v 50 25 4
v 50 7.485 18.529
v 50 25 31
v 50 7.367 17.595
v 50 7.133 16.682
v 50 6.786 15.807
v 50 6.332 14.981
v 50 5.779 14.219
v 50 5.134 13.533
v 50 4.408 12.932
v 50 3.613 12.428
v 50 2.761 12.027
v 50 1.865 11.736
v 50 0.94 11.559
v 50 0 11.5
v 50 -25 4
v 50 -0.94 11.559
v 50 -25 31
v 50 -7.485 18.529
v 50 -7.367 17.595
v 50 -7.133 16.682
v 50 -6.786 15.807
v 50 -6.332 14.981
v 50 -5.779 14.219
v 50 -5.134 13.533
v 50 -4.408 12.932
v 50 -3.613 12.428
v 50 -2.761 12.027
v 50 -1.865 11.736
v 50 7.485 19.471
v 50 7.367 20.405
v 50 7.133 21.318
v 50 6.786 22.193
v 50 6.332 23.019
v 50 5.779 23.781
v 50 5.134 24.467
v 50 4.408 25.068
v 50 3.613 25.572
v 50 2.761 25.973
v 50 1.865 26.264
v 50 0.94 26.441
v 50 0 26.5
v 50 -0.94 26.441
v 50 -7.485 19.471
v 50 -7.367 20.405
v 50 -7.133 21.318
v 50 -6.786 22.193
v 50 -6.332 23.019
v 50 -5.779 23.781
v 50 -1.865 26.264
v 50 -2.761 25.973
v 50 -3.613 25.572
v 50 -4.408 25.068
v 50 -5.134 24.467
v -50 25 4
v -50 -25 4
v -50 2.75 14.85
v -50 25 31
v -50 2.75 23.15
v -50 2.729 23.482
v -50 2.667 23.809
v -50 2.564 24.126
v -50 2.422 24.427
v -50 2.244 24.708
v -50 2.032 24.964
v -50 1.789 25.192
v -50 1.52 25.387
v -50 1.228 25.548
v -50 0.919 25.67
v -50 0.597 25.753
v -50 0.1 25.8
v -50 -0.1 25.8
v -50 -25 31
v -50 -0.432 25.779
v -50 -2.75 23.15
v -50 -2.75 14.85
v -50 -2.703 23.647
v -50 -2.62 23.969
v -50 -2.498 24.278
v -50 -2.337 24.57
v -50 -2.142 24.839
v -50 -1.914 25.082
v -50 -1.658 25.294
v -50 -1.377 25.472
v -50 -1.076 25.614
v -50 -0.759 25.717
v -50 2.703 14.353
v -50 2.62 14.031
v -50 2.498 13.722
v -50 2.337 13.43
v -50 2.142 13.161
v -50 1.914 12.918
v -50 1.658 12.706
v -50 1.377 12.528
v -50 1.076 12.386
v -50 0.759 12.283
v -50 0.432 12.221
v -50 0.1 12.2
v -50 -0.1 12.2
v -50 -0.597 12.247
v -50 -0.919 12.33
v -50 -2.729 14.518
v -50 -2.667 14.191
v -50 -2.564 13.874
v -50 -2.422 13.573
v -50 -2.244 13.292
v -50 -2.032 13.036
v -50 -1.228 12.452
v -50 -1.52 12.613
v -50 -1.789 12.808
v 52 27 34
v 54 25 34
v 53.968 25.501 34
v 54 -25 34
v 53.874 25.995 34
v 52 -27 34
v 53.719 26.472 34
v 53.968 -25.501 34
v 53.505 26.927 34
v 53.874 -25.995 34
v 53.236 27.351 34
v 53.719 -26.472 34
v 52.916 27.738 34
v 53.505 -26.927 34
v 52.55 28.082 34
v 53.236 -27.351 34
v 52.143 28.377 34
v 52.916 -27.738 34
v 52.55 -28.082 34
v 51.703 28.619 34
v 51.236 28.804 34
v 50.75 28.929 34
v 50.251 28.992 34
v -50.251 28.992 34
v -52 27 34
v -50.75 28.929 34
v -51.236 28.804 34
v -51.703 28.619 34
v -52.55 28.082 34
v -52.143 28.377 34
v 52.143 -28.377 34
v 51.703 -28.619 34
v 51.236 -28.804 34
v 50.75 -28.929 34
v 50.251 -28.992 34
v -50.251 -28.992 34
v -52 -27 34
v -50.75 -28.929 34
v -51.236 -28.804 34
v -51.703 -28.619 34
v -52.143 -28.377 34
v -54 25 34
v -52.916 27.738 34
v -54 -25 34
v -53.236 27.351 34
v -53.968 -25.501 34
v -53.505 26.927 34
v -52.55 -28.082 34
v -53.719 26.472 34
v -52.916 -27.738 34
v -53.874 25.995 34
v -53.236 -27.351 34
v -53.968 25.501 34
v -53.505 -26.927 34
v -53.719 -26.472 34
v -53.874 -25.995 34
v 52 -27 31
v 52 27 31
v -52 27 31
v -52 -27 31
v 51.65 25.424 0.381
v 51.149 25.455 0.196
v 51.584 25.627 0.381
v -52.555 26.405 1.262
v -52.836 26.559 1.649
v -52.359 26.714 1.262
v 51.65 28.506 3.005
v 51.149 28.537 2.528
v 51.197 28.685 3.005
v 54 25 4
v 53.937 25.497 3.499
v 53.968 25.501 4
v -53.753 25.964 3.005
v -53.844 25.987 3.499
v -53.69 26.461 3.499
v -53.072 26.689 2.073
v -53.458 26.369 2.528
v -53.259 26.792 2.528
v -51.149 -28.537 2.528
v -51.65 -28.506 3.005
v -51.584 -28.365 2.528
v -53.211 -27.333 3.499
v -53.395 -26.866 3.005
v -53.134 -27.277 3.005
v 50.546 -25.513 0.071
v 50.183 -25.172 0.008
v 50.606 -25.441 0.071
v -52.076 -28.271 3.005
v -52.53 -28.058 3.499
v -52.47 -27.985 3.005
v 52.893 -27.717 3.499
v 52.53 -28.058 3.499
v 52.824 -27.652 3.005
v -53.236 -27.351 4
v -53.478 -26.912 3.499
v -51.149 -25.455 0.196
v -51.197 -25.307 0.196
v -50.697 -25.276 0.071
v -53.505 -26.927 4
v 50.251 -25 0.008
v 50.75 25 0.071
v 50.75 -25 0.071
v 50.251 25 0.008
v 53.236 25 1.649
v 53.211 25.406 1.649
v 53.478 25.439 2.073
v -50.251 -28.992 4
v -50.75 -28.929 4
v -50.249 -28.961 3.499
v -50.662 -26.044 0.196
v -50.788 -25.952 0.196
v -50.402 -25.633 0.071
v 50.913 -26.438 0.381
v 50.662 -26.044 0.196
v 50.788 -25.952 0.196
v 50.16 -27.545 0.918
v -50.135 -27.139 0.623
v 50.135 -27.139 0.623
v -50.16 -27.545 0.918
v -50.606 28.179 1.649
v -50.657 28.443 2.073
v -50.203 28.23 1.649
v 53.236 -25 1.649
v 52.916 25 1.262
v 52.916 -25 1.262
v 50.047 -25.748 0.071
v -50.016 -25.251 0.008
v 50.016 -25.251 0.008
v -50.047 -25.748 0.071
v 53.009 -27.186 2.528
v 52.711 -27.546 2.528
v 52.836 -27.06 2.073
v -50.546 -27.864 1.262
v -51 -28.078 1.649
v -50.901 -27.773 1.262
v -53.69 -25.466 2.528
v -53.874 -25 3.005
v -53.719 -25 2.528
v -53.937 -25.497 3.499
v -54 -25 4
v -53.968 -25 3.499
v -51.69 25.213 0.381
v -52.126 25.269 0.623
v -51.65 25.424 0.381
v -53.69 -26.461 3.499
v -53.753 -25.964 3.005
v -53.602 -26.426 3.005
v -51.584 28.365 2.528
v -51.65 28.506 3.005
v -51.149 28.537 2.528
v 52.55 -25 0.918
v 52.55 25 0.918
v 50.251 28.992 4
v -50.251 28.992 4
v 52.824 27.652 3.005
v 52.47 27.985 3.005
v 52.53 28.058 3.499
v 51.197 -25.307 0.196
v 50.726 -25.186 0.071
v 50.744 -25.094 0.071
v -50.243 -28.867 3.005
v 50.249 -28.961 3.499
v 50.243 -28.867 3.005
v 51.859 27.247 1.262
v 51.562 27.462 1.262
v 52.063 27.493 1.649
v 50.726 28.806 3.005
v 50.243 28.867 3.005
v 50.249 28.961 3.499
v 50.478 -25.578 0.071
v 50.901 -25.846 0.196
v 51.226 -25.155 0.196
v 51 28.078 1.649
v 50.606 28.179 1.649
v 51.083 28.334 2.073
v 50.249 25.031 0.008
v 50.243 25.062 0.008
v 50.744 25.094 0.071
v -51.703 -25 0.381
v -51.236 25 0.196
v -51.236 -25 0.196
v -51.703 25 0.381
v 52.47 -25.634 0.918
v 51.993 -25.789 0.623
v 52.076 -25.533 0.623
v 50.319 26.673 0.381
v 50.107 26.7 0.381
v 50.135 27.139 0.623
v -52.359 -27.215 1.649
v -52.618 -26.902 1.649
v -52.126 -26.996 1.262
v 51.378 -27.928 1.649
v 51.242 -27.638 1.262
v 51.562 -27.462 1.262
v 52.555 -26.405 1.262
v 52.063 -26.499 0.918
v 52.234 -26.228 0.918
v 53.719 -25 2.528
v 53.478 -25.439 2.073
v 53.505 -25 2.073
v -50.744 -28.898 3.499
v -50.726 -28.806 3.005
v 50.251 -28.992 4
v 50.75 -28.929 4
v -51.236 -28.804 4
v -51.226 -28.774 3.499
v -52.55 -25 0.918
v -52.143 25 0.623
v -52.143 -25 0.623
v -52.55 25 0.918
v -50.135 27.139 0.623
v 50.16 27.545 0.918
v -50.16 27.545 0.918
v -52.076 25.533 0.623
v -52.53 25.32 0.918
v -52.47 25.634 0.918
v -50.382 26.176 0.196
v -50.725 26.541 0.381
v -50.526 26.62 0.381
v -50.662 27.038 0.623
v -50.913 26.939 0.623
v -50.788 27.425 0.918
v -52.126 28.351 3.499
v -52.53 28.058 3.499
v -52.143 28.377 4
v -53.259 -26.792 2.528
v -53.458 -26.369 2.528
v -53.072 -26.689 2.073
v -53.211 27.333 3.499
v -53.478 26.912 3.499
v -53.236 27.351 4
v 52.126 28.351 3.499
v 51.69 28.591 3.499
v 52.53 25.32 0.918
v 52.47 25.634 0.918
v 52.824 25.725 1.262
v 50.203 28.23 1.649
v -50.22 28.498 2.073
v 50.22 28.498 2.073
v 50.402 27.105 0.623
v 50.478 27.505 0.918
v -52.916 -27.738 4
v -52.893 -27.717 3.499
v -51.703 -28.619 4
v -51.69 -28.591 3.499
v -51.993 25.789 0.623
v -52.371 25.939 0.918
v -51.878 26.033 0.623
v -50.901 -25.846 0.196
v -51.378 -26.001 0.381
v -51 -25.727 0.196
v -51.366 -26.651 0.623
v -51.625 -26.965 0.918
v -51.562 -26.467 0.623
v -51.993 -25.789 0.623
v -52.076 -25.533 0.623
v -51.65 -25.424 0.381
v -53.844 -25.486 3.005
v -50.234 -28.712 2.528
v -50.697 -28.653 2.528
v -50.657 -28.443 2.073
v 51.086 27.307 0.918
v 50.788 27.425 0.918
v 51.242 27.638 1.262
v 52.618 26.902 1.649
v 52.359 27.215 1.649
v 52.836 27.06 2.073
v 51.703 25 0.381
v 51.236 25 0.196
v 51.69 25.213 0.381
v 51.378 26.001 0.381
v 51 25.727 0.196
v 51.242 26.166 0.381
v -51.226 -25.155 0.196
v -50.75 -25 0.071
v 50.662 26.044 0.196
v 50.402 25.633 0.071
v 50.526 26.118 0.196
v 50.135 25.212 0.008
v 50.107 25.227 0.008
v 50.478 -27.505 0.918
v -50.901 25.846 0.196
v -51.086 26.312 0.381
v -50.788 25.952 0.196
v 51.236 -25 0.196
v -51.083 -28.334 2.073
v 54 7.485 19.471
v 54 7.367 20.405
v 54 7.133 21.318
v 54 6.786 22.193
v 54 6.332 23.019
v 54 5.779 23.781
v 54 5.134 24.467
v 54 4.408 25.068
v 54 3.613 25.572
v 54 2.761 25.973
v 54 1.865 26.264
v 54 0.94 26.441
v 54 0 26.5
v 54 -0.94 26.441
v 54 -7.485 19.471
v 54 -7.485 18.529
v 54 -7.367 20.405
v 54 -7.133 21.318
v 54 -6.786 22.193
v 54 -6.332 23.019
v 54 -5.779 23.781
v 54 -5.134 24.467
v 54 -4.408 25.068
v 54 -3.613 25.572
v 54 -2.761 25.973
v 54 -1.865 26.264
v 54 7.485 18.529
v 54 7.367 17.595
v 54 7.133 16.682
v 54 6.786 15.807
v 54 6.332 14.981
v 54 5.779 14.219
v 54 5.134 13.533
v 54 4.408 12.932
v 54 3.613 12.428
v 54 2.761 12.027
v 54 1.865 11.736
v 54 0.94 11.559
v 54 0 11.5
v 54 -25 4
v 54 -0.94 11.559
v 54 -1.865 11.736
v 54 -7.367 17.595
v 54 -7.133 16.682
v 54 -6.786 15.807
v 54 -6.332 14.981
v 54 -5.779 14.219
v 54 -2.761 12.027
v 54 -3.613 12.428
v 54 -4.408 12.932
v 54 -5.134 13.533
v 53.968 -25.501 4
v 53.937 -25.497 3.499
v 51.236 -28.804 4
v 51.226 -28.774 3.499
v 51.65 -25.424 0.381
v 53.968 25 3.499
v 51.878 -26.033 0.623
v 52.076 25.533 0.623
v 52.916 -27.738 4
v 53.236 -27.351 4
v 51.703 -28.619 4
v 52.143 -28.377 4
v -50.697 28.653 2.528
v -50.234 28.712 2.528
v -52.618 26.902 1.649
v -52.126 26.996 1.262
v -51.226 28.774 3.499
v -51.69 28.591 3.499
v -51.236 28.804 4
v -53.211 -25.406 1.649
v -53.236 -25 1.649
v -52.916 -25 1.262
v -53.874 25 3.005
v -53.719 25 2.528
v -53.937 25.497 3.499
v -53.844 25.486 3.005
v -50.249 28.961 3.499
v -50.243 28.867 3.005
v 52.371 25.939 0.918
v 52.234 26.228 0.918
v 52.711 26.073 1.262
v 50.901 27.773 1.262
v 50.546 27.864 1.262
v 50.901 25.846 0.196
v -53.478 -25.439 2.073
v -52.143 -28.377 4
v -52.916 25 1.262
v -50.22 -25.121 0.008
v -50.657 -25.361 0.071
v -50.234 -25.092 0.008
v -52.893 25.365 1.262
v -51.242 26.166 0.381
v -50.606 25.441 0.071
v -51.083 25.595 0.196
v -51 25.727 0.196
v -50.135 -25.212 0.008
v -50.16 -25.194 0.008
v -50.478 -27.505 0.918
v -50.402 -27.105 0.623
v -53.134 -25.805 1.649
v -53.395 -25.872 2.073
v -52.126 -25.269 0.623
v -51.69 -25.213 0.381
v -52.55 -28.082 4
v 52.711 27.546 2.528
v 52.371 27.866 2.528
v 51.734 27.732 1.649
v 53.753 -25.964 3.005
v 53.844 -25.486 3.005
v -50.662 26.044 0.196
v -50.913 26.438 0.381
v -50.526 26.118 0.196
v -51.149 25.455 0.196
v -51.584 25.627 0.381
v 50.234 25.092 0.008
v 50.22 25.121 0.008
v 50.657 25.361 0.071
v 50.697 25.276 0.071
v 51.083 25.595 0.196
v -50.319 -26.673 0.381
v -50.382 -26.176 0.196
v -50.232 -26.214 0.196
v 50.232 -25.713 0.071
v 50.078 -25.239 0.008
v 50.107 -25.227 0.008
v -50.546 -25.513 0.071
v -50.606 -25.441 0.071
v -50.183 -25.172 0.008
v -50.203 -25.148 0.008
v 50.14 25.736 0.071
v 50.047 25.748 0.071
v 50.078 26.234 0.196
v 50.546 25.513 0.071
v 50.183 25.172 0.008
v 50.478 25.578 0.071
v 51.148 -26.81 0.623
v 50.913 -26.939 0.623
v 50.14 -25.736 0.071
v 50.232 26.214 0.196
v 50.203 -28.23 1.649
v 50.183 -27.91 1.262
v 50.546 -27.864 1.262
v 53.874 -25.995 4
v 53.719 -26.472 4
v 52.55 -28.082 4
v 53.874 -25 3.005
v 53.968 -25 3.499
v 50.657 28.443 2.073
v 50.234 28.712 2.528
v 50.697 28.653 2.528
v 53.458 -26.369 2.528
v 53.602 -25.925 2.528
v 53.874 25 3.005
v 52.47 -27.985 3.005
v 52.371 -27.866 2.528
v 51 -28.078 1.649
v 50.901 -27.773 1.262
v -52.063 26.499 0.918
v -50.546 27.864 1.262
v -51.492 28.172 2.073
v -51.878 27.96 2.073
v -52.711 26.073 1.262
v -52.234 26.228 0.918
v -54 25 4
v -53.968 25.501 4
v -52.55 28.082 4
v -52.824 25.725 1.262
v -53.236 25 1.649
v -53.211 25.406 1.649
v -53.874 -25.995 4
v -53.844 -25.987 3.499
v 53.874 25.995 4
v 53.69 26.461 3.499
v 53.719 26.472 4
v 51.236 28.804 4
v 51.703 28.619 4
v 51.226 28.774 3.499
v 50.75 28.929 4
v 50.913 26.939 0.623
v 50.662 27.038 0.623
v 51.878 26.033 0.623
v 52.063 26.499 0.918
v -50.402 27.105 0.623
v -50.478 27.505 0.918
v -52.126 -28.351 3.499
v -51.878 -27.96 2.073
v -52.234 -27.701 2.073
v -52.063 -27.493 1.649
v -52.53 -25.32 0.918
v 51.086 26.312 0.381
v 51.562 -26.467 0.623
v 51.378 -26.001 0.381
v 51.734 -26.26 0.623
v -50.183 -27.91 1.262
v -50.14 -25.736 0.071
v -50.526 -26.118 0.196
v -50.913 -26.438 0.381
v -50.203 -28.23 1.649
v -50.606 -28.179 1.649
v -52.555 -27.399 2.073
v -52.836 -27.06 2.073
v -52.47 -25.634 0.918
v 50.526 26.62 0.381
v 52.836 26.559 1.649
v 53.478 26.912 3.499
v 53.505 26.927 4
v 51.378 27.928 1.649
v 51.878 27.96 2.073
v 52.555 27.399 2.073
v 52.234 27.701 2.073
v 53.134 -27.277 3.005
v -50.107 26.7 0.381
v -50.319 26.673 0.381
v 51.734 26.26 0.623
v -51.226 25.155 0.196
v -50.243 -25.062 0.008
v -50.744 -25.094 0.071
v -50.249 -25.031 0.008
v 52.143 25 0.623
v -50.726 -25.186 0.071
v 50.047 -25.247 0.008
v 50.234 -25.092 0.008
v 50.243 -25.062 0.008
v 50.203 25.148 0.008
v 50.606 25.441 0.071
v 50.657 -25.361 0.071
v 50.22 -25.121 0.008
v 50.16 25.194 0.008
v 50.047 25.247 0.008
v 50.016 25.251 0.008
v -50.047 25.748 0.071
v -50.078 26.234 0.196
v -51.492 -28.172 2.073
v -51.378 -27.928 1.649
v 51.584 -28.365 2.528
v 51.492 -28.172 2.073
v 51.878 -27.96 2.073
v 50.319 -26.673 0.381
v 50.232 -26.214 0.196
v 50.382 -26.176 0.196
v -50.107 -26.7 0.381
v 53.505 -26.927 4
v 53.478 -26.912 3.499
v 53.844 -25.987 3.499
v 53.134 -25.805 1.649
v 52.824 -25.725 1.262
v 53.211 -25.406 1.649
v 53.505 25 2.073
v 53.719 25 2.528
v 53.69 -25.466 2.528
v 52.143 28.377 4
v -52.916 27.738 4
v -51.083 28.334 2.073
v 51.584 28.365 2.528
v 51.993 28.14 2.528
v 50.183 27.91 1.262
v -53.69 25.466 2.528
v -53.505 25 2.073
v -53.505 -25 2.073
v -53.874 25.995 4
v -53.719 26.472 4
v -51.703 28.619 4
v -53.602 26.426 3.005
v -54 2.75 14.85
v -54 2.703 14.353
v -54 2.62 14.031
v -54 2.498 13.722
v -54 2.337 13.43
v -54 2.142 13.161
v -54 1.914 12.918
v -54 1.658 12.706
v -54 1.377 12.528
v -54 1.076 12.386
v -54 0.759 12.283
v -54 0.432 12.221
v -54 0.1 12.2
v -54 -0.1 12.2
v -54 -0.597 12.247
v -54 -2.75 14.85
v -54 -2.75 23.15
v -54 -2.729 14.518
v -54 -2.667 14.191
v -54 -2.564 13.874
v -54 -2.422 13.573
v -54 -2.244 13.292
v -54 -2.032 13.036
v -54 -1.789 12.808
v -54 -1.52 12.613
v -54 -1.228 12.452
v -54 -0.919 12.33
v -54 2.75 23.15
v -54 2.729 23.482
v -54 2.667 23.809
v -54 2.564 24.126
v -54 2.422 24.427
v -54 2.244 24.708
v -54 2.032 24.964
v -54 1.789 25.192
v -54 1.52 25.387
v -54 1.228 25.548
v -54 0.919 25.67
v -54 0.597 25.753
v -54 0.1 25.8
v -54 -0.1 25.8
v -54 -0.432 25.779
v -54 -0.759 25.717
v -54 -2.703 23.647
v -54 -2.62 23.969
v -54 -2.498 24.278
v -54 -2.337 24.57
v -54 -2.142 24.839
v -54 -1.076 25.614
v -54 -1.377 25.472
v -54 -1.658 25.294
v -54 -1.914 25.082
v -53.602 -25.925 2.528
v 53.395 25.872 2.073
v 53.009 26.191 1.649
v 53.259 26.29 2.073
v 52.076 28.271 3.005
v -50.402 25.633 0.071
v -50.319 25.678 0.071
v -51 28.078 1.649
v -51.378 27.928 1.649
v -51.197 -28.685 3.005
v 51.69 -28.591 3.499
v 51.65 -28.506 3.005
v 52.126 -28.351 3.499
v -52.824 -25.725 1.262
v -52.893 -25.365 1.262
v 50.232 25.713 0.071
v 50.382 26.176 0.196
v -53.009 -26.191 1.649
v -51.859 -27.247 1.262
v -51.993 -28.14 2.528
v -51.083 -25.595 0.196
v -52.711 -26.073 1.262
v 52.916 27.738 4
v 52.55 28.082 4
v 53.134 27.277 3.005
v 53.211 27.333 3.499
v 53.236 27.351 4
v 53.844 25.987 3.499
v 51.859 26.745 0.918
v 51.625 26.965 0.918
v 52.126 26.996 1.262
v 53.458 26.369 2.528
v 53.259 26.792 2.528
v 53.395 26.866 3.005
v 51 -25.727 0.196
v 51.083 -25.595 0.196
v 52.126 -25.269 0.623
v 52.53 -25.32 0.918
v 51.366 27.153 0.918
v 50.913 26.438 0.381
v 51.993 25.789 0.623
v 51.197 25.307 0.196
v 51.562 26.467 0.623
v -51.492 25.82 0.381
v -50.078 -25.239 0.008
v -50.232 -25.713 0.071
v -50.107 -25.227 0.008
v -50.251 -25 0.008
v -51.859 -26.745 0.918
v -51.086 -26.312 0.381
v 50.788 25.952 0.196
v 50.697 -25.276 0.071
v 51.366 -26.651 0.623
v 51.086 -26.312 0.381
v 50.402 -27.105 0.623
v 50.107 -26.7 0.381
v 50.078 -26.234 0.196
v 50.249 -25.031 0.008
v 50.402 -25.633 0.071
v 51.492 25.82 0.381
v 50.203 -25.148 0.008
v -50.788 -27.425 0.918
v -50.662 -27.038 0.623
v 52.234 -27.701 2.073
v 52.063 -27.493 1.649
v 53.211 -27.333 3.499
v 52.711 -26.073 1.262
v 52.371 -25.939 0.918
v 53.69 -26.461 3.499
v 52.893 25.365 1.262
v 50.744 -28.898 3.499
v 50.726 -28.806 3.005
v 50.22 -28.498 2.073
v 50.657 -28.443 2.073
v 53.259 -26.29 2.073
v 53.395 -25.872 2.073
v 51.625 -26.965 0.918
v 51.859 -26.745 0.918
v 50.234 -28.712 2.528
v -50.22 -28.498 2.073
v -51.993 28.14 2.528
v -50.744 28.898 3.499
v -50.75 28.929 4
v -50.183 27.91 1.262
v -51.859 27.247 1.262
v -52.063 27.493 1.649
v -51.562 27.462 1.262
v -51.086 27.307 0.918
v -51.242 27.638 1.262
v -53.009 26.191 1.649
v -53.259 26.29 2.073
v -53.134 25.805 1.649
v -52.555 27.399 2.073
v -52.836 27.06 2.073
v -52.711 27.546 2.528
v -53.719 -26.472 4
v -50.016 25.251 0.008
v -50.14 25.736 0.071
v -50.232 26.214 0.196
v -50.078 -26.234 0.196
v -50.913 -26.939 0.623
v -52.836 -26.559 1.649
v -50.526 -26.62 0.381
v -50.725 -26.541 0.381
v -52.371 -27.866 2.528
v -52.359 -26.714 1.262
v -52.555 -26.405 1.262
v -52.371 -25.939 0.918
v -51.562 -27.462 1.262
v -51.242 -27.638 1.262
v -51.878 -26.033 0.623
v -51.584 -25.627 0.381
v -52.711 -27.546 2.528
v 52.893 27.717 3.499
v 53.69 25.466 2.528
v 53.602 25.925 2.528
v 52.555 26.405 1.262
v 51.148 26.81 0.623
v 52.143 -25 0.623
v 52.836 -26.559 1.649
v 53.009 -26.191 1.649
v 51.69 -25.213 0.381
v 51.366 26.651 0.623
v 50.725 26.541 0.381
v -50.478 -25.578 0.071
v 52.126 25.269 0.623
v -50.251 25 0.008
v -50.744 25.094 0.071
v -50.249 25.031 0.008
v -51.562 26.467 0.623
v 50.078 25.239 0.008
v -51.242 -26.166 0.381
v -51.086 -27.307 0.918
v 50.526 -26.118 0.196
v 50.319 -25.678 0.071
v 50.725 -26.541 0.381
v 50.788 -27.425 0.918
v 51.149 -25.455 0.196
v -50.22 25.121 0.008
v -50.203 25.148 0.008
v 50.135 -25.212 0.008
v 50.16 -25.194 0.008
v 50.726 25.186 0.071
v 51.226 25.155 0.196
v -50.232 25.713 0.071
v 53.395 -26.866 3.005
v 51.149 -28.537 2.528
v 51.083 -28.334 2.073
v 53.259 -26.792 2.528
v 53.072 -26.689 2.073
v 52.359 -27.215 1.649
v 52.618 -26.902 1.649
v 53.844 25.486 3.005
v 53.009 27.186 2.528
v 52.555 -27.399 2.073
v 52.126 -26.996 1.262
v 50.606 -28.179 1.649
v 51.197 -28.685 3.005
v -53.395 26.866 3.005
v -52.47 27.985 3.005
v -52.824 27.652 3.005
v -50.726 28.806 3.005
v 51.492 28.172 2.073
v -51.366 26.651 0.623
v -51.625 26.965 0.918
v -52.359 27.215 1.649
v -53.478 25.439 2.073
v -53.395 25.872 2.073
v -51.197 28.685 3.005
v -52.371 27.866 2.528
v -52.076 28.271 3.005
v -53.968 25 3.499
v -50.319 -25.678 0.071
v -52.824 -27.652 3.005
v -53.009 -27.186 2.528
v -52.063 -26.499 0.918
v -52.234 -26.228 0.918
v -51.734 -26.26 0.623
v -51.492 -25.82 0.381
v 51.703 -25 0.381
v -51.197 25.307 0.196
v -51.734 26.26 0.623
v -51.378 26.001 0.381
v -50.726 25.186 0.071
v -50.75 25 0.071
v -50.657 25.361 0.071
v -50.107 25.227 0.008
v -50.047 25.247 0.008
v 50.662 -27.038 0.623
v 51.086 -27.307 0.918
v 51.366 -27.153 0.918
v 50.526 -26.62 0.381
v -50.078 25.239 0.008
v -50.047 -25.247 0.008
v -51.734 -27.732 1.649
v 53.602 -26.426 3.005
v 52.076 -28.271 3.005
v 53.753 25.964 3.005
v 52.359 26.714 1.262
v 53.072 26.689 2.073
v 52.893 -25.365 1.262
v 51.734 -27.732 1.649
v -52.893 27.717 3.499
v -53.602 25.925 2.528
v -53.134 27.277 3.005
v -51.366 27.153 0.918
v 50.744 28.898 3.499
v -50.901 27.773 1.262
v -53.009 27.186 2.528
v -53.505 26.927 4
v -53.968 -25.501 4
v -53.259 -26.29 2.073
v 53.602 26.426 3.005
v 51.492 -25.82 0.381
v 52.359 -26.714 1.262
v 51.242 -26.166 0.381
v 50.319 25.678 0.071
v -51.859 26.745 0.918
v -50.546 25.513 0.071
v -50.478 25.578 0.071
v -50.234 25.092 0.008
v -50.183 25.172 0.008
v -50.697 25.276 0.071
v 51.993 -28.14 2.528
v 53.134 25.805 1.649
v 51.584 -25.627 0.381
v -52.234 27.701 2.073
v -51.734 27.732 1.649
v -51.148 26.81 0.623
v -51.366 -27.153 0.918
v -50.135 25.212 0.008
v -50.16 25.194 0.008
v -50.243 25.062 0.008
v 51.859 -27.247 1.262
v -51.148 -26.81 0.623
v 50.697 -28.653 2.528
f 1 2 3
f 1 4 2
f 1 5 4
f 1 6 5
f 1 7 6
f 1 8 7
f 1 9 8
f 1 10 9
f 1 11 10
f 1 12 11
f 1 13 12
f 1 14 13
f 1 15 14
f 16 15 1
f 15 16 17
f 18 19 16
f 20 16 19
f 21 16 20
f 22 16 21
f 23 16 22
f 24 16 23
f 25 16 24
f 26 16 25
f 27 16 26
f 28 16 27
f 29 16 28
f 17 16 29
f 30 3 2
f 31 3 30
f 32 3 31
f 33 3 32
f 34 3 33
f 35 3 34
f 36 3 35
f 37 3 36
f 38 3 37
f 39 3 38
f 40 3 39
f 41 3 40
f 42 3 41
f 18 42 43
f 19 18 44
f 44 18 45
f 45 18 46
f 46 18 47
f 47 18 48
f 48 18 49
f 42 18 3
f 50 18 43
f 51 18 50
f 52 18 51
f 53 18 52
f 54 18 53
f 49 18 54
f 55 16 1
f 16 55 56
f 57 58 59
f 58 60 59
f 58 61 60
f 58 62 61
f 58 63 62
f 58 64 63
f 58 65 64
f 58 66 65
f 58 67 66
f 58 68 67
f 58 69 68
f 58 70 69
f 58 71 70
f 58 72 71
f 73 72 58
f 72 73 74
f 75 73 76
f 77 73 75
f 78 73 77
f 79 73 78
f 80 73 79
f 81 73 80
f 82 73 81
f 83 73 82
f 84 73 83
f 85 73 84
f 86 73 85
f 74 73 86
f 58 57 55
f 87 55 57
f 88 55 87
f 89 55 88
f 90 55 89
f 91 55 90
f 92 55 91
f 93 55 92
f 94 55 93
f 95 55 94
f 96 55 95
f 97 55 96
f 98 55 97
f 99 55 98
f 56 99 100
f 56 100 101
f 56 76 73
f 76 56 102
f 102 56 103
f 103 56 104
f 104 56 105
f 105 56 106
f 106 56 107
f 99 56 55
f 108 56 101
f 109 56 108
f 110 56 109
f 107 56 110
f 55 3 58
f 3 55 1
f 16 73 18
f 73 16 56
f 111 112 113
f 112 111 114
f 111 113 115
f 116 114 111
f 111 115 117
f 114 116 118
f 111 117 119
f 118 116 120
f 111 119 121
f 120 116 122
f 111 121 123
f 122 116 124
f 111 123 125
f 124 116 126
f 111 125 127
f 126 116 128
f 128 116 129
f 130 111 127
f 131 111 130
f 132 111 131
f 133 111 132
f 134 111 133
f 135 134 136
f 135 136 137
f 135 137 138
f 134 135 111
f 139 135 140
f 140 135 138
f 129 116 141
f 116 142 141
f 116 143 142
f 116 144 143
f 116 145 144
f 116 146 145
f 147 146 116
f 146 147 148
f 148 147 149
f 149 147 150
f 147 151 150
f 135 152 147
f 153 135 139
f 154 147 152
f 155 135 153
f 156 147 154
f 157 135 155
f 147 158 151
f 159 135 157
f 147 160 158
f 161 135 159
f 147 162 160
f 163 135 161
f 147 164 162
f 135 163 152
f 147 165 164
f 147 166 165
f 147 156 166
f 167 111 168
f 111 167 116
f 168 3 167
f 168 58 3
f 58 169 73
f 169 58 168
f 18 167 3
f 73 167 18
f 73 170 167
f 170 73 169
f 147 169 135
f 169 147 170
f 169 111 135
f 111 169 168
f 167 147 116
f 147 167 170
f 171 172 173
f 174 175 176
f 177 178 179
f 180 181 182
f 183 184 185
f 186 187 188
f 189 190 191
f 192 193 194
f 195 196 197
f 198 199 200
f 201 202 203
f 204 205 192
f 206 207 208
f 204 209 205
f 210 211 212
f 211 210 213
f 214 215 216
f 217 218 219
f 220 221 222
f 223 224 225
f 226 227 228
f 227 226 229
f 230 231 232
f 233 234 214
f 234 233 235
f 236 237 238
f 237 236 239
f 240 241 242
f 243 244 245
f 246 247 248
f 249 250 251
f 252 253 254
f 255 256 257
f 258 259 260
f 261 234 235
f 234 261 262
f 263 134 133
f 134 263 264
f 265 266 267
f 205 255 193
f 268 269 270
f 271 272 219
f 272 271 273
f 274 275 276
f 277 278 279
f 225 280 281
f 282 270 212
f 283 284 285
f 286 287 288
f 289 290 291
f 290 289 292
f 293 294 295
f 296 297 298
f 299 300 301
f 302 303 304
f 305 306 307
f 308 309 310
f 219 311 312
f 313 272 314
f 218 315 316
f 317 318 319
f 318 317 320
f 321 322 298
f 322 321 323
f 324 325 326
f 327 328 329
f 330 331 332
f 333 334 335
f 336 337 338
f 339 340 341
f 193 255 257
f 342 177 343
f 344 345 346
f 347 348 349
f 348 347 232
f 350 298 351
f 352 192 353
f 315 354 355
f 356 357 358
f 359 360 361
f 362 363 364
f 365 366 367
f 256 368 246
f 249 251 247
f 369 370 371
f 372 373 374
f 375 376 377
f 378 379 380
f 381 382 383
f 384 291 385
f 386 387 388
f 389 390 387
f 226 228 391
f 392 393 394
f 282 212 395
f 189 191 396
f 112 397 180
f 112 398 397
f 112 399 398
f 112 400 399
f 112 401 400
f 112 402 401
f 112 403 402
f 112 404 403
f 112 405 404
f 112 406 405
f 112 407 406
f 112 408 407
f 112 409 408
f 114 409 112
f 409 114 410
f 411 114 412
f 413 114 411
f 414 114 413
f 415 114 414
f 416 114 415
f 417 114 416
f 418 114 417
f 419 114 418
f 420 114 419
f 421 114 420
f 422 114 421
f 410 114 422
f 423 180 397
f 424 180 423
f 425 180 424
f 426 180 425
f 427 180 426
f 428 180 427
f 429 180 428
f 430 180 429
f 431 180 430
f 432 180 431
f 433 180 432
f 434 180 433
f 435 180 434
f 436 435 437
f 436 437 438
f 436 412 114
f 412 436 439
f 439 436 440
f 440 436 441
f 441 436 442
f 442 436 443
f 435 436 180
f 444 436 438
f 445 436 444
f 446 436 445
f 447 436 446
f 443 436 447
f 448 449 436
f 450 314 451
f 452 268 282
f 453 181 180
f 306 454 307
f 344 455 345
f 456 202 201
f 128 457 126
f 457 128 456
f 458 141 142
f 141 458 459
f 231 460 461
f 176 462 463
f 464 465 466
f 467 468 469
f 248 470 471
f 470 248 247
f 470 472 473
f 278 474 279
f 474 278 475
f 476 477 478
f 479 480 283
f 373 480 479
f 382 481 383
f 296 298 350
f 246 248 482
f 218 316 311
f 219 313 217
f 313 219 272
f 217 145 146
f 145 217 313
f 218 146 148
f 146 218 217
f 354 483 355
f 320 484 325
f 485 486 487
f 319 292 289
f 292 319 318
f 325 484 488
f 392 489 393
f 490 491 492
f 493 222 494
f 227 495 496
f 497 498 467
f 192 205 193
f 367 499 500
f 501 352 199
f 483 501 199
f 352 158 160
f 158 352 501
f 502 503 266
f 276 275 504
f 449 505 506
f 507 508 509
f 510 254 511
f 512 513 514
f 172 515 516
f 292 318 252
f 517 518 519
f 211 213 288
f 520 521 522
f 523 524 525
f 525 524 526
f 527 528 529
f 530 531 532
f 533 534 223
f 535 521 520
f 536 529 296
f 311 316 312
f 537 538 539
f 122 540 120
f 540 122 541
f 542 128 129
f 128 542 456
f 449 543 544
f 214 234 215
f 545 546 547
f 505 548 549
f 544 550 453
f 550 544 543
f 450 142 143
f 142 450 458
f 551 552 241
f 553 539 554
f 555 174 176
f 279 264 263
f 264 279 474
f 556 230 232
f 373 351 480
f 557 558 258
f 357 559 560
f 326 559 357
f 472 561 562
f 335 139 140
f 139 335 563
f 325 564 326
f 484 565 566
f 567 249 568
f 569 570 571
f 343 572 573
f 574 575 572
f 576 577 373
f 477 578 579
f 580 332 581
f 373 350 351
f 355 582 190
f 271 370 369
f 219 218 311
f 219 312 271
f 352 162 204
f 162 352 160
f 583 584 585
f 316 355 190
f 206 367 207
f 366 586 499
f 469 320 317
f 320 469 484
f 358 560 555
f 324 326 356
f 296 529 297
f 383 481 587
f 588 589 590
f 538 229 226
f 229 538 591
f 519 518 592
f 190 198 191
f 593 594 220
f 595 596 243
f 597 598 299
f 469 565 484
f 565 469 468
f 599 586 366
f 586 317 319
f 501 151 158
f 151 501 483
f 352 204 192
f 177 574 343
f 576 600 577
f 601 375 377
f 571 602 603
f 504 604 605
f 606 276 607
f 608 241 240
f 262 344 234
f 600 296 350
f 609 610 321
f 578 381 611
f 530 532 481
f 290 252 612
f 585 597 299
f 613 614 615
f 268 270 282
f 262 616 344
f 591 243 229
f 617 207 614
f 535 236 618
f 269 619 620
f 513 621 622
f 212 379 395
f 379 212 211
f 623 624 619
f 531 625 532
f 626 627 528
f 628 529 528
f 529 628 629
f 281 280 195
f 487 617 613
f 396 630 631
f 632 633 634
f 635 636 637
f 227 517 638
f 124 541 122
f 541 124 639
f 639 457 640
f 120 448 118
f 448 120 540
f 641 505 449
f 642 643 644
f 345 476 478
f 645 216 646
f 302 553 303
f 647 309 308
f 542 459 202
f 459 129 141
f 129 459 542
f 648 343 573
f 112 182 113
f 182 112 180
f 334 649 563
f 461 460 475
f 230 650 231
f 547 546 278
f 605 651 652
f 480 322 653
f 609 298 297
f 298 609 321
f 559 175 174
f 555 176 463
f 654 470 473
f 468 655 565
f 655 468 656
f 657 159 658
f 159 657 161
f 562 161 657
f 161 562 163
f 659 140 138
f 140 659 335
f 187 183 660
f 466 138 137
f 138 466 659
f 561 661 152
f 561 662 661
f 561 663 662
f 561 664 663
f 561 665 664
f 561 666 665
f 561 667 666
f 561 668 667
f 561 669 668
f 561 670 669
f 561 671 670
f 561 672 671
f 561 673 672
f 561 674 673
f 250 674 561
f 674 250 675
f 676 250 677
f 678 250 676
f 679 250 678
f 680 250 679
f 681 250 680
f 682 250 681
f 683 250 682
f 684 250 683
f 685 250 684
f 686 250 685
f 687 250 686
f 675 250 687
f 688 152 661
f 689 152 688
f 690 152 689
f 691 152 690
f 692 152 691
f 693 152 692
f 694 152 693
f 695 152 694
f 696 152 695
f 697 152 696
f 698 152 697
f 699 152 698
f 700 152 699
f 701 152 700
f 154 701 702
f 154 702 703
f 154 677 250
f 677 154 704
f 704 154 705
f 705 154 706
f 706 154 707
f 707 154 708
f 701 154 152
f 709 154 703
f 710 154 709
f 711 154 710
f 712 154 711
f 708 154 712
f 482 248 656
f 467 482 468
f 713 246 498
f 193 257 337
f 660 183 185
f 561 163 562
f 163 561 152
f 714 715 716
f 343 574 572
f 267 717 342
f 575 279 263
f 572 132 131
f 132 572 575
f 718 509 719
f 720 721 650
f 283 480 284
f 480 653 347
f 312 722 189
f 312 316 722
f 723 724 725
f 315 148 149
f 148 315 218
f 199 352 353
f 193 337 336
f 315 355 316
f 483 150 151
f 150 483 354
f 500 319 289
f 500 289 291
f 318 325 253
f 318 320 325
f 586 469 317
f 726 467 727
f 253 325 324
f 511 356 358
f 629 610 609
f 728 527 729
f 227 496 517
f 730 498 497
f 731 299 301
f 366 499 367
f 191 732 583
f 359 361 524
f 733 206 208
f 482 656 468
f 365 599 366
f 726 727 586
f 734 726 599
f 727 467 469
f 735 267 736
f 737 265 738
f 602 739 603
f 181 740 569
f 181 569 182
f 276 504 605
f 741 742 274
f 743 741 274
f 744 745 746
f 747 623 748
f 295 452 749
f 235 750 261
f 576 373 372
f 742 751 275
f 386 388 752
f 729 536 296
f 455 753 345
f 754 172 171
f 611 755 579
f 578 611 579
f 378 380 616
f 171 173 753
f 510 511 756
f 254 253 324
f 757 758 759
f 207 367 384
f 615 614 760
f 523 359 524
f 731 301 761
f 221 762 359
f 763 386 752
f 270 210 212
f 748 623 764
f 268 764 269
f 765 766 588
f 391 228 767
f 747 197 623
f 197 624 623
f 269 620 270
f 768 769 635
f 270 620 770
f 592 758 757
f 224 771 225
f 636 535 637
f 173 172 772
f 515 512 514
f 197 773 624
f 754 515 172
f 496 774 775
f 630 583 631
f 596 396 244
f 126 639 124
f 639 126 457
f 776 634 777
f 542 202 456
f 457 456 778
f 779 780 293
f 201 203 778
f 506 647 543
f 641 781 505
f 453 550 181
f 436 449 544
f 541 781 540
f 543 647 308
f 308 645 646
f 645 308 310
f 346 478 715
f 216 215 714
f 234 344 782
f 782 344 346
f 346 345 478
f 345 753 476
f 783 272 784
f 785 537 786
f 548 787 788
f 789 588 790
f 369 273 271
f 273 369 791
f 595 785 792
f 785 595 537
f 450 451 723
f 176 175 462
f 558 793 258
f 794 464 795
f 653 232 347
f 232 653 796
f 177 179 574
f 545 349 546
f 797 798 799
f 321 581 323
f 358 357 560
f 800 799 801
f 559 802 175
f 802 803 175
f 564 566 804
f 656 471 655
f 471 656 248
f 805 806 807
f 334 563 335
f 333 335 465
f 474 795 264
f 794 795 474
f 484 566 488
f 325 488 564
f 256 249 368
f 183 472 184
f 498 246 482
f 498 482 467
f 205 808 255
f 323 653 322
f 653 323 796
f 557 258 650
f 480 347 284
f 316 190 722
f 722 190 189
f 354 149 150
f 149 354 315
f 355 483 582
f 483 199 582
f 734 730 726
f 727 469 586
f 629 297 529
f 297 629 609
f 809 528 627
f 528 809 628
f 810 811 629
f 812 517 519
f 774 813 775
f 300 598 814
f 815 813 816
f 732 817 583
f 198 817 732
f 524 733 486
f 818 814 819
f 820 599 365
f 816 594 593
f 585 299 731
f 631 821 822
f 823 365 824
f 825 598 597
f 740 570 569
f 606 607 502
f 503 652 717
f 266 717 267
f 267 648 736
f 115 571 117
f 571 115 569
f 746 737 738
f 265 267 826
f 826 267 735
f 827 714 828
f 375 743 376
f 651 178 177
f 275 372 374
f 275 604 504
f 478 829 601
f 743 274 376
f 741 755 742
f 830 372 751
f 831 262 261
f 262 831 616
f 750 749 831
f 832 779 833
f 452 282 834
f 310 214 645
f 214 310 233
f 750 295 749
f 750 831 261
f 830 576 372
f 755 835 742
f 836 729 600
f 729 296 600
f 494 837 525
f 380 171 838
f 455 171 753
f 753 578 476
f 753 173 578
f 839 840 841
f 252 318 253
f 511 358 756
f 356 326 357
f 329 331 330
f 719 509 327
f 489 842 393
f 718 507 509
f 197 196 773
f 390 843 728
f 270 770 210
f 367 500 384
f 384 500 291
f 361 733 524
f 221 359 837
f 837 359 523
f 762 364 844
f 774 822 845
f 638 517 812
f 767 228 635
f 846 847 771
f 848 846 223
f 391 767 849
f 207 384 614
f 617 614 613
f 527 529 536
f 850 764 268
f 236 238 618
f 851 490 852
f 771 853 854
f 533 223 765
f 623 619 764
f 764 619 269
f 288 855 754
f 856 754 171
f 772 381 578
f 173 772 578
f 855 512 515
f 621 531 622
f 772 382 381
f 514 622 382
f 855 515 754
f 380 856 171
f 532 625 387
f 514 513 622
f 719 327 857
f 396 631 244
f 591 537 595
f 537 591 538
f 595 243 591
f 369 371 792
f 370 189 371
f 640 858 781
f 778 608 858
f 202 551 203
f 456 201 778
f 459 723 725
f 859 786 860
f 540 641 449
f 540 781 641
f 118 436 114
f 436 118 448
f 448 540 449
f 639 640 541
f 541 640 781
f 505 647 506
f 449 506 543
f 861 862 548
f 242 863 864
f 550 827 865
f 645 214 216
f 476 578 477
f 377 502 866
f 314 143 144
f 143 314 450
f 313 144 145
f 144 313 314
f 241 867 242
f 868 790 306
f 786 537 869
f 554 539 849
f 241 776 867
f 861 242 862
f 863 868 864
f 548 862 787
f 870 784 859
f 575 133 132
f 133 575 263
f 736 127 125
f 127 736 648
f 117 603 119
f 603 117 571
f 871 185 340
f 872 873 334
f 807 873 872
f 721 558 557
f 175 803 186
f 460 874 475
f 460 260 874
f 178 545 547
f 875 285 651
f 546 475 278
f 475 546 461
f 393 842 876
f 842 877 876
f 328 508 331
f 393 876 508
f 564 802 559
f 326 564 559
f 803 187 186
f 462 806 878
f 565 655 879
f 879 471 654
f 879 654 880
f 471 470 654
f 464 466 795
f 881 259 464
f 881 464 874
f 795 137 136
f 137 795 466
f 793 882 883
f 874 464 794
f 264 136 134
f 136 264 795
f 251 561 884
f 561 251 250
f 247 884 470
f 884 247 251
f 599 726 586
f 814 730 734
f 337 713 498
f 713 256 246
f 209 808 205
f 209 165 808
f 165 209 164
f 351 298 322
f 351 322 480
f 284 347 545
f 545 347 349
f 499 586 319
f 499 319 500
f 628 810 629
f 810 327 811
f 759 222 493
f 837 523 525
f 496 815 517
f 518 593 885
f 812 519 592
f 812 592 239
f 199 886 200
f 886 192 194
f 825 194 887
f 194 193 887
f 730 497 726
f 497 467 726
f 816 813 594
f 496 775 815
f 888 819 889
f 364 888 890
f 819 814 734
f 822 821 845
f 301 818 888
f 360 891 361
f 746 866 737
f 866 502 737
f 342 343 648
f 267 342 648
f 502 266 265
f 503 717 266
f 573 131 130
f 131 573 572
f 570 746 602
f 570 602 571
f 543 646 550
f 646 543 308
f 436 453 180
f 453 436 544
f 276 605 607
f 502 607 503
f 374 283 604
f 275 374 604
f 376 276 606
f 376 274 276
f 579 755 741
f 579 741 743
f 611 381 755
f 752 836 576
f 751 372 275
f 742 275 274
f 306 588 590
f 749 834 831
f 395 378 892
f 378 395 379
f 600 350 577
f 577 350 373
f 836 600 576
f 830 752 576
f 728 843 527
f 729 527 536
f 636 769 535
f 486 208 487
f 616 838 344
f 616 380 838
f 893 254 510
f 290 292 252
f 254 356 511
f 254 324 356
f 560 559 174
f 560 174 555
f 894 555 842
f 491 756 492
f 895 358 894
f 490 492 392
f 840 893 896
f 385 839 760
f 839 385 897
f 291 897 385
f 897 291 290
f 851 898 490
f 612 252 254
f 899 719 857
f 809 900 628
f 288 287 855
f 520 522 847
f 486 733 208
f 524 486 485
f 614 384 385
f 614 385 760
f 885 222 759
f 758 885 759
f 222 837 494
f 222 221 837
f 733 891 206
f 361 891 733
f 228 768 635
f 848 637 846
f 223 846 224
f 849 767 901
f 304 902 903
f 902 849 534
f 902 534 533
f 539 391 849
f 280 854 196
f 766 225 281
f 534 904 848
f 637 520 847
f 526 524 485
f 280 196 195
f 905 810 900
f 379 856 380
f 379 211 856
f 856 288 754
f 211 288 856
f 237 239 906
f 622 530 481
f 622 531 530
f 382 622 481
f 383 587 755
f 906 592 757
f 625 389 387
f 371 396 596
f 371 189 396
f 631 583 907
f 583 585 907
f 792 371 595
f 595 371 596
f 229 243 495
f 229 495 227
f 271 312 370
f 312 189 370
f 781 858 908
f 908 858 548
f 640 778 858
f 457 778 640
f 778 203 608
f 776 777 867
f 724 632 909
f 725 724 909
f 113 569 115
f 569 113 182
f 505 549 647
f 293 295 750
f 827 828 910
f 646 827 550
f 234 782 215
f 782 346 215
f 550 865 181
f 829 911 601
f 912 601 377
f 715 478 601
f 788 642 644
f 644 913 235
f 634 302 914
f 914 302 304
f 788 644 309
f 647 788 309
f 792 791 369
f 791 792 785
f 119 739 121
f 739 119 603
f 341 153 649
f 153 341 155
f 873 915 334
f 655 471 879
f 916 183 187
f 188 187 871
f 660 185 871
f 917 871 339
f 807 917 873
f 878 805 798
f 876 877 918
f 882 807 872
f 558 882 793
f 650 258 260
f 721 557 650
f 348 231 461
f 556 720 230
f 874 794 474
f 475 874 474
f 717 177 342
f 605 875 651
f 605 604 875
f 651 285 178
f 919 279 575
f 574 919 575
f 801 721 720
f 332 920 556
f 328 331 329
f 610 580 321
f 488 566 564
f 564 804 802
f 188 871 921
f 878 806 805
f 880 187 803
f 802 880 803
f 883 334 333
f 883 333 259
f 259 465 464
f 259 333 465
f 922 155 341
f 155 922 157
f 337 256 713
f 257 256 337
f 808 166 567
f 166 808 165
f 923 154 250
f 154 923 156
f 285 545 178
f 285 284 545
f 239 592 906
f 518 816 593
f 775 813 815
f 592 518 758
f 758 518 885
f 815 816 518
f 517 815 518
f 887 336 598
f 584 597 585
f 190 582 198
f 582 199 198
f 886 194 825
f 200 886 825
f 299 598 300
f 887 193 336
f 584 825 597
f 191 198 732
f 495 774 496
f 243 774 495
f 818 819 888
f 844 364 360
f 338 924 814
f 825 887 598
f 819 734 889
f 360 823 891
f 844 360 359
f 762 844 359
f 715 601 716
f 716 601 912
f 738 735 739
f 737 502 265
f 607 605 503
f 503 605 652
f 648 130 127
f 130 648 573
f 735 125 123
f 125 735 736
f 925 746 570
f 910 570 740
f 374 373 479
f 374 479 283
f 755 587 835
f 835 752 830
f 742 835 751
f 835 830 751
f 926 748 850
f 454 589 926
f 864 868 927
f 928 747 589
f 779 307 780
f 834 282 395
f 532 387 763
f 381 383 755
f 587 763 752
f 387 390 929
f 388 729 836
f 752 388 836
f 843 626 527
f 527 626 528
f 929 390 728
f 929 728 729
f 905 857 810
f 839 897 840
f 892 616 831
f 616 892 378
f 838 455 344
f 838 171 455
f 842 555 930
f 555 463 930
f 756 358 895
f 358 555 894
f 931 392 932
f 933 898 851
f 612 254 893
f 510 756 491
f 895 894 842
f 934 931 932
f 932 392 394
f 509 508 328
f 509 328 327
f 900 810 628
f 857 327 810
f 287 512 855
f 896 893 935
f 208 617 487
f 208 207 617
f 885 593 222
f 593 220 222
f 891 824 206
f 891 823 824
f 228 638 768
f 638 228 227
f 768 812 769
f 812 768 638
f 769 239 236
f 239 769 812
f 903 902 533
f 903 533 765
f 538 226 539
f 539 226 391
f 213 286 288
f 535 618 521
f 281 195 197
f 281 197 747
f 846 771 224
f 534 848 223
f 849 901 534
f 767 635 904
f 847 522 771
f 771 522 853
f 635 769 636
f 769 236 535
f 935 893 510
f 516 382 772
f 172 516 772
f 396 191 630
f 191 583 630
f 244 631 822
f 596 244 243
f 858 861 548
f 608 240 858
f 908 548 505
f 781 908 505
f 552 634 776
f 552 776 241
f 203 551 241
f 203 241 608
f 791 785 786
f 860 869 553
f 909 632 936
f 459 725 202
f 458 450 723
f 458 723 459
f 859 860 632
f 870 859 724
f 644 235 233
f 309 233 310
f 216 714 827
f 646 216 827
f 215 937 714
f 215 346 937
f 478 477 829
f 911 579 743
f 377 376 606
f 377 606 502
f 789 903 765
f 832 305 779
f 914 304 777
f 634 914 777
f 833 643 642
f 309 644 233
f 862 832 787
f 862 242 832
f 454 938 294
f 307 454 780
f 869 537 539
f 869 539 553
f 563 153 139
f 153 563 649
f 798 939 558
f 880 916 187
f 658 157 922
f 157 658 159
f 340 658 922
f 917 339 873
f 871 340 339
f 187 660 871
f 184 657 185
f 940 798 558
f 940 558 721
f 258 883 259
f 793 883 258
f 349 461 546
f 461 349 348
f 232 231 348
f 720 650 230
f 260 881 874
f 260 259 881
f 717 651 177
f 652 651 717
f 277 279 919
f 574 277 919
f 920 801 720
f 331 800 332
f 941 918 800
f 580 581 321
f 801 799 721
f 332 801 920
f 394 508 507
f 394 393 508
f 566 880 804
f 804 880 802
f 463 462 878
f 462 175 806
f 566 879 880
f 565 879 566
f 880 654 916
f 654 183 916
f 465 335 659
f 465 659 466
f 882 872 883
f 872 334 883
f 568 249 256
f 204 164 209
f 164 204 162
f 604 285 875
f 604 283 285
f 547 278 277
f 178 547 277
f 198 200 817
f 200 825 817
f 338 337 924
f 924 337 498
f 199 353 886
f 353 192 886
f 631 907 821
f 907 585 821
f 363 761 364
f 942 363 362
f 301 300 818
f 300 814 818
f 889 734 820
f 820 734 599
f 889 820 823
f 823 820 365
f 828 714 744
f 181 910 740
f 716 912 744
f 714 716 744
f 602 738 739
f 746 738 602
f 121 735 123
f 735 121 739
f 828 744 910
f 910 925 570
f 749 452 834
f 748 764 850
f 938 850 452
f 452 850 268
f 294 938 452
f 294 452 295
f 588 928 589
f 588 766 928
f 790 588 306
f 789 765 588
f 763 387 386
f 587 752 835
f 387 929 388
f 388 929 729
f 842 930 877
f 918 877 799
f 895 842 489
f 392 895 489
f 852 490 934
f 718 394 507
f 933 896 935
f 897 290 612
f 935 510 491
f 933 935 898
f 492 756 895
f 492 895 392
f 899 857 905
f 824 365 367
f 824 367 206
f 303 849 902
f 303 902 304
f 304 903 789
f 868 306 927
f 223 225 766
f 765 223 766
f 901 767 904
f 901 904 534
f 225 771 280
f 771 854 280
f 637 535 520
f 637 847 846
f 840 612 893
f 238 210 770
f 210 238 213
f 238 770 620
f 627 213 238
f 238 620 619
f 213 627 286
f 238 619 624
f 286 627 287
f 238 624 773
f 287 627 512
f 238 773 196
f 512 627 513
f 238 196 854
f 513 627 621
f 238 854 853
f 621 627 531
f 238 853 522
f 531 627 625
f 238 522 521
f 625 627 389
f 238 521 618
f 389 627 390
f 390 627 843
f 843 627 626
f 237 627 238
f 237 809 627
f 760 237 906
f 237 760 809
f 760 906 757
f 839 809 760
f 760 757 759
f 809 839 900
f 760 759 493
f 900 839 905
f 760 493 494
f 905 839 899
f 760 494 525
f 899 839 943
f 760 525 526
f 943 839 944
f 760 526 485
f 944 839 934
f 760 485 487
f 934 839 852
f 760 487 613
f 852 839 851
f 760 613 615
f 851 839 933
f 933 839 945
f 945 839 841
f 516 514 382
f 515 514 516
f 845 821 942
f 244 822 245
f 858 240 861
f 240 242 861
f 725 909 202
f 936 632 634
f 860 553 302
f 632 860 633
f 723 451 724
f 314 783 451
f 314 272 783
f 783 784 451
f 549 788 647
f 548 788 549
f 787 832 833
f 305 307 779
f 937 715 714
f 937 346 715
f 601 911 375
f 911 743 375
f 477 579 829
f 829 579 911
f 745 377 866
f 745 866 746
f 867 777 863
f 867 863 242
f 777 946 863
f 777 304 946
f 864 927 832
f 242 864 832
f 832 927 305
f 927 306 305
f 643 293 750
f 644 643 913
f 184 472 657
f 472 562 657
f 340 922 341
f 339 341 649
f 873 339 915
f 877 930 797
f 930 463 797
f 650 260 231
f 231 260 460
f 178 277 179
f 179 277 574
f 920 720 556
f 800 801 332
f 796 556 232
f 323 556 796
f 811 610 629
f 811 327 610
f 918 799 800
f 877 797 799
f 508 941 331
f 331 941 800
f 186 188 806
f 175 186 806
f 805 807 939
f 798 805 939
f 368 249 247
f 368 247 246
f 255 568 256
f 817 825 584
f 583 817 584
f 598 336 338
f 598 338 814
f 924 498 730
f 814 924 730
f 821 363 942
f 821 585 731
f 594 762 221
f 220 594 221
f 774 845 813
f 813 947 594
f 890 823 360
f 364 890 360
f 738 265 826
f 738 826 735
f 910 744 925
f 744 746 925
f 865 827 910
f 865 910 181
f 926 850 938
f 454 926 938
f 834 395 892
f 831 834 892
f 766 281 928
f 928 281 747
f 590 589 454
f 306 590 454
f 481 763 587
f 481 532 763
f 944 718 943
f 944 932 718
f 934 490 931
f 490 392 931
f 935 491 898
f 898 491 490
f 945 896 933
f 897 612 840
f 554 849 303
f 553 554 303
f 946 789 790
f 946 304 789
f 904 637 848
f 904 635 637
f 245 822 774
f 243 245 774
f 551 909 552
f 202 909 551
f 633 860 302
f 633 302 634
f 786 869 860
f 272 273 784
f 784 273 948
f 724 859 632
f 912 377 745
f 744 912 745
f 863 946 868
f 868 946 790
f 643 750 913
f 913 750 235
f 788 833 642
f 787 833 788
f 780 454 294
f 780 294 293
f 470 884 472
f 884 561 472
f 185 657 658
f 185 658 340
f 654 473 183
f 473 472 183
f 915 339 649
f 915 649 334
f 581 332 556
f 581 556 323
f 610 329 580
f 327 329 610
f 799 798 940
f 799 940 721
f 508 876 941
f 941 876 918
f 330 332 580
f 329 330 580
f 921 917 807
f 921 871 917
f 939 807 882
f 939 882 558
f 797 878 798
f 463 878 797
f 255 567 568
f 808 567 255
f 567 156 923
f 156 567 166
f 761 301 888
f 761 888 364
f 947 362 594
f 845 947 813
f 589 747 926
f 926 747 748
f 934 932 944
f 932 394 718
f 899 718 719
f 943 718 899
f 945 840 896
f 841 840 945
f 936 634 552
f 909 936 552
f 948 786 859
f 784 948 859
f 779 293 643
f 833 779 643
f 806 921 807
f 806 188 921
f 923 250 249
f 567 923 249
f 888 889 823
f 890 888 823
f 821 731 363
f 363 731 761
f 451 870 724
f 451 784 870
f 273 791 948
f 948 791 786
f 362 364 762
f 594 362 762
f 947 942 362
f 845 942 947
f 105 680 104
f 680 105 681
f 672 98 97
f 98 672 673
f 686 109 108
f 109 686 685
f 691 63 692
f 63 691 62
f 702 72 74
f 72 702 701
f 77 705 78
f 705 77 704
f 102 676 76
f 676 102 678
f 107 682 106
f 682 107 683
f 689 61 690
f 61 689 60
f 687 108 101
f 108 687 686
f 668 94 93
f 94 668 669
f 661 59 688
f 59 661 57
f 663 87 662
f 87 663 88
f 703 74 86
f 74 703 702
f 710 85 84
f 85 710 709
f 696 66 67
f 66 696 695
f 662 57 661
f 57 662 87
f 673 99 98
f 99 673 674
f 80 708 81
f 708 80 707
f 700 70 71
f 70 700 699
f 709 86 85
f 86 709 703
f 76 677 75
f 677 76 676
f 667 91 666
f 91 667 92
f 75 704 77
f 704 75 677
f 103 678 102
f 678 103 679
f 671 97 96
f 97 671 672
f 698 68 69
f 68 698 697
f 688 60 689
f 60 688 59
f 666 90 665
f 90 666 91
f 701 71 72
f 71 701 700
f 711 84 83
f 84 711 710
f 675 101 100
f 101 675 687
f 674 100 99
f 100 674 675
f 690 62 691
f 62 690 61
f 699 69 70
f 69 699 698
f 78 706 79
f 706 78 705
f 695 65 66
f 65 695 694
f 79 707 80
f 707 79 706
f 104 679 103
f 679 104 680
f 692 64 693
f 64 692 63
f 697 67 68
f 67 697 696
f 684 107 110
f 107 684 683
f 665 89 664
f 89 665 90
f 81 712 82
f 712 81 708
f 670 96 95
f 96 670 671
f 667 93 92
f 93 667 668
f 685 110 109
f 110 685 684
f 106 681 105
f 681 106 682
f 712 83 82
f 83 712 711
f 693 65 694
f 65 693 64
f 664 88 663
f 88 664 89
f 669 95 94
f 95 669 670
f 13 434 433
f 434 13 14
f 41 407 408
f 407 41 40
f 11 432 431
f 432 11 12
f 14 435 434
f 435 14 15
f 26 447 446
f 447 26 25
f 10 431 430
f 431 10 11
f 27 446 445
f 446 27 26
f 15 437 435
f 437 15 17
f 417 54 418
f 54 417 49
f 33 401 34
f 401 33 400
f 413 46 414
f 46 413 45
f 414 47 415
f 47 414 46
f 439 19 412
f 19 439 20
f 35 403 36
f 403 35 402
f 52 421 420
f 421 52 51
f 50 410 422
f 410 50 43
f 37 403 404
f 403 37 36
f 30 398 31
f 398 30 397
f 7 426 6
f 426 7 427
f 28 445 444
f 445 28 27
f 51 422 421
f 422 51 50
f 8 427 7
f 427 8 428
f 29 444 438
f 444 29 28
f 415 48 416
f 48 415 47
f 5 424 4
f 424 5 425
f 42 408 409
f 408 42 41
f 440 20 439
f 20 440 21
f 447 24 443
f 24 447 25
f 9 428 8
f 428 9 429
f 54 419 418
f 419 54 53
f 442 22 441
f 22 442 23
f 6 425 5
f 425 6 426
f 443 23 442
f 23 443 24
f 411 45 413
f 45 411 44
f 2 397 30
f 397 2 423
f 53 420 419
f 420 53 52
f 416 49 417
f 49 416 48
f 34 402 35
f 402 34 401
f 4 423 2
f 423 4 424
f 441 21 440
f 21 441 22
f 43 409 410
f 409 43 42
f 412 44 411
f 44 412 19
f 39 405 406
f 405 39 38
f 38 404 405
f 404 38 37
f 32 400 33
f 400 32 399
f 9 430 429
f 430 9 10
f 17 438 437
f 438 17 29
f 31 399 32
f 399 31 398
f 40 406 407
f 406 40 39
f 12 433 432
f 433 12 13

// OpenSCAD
echo(version=version());
$fn=50;
boxLength = 100;
boxWidth = 50;
wallheight = 30;
wallthickness = 4;
boxCornerCurveRadius = wallthickness;
corners = [[0,0,0],[boxWidth,0,0],[0,boxLength,0],[boxWidth,boxLength,0],
[0,0,wallheight],[boxWidth,0,wallheight],[0,boxLength,wallheight],[boxWidth,boxLength,wallheight]];

difference()  {
    translate([-boxWidth,-boxLength/4,boxCornerCurveRadius])
        hull(){
            BoxCorners();
        };
    BoxVoid();
    UsbPortHole();
    SwitchHole();
}

module BoxVoid(){
    translate([0,0,20+wallthickness])
        union(){
            cube([boxLength,boxWidth,40],center = true);
            translate([0,0,15]) 
                cube([boxLength+wallthickness+boxCornerCurveRadius,boxWidth+wallthickness+boxCornerCurveRadius,10],center = true);
            translate([0,0,12]) 
                cube([boxLength+wallthickness,boxWidth+wallthickness,10],center = true);
        }
}

module BoxCorners(){
    for (a = corners)
        translate([a[1],a[0],a[2]]) 
            sphere(boxCornerCurveRadius);
}

module UsbPortHole(){
    translate([-57,0,boxCornerCurveRadius+wallheight/2])
        rotate([0,90,0])
            rotate([0,0,90])
                linear_extrude(height = 10, scale = 1)
                    offset(r=2.65)
                        square([0.2, 8.3], center = true);
}


module SwitchHole(){
    translate([52,0,boxCornerCurveRadius+wallheight/2])
        rotate([0,90,0])
            linear_extrude(height = 10, center = true)
                circle(d=15);
}

module Walls(){
    linear_extrude(height = wallheight, scale = 1)
        difference()  {
            BoxFootprint(boxLength,boxWidth);
            BoxFootprint(boxLength-wallthickness, boxWidth-wallthickness);
        }
}

module Base(){
    translate([0,0,-2])
        linear_extrude(height = 3, scale = 1)
            BoxFootprint(boxLength,boxWidth);
}

module BoxFootprint(x, y){
    offset(r=wallthickness)
        square([x, y], center = true);
}
